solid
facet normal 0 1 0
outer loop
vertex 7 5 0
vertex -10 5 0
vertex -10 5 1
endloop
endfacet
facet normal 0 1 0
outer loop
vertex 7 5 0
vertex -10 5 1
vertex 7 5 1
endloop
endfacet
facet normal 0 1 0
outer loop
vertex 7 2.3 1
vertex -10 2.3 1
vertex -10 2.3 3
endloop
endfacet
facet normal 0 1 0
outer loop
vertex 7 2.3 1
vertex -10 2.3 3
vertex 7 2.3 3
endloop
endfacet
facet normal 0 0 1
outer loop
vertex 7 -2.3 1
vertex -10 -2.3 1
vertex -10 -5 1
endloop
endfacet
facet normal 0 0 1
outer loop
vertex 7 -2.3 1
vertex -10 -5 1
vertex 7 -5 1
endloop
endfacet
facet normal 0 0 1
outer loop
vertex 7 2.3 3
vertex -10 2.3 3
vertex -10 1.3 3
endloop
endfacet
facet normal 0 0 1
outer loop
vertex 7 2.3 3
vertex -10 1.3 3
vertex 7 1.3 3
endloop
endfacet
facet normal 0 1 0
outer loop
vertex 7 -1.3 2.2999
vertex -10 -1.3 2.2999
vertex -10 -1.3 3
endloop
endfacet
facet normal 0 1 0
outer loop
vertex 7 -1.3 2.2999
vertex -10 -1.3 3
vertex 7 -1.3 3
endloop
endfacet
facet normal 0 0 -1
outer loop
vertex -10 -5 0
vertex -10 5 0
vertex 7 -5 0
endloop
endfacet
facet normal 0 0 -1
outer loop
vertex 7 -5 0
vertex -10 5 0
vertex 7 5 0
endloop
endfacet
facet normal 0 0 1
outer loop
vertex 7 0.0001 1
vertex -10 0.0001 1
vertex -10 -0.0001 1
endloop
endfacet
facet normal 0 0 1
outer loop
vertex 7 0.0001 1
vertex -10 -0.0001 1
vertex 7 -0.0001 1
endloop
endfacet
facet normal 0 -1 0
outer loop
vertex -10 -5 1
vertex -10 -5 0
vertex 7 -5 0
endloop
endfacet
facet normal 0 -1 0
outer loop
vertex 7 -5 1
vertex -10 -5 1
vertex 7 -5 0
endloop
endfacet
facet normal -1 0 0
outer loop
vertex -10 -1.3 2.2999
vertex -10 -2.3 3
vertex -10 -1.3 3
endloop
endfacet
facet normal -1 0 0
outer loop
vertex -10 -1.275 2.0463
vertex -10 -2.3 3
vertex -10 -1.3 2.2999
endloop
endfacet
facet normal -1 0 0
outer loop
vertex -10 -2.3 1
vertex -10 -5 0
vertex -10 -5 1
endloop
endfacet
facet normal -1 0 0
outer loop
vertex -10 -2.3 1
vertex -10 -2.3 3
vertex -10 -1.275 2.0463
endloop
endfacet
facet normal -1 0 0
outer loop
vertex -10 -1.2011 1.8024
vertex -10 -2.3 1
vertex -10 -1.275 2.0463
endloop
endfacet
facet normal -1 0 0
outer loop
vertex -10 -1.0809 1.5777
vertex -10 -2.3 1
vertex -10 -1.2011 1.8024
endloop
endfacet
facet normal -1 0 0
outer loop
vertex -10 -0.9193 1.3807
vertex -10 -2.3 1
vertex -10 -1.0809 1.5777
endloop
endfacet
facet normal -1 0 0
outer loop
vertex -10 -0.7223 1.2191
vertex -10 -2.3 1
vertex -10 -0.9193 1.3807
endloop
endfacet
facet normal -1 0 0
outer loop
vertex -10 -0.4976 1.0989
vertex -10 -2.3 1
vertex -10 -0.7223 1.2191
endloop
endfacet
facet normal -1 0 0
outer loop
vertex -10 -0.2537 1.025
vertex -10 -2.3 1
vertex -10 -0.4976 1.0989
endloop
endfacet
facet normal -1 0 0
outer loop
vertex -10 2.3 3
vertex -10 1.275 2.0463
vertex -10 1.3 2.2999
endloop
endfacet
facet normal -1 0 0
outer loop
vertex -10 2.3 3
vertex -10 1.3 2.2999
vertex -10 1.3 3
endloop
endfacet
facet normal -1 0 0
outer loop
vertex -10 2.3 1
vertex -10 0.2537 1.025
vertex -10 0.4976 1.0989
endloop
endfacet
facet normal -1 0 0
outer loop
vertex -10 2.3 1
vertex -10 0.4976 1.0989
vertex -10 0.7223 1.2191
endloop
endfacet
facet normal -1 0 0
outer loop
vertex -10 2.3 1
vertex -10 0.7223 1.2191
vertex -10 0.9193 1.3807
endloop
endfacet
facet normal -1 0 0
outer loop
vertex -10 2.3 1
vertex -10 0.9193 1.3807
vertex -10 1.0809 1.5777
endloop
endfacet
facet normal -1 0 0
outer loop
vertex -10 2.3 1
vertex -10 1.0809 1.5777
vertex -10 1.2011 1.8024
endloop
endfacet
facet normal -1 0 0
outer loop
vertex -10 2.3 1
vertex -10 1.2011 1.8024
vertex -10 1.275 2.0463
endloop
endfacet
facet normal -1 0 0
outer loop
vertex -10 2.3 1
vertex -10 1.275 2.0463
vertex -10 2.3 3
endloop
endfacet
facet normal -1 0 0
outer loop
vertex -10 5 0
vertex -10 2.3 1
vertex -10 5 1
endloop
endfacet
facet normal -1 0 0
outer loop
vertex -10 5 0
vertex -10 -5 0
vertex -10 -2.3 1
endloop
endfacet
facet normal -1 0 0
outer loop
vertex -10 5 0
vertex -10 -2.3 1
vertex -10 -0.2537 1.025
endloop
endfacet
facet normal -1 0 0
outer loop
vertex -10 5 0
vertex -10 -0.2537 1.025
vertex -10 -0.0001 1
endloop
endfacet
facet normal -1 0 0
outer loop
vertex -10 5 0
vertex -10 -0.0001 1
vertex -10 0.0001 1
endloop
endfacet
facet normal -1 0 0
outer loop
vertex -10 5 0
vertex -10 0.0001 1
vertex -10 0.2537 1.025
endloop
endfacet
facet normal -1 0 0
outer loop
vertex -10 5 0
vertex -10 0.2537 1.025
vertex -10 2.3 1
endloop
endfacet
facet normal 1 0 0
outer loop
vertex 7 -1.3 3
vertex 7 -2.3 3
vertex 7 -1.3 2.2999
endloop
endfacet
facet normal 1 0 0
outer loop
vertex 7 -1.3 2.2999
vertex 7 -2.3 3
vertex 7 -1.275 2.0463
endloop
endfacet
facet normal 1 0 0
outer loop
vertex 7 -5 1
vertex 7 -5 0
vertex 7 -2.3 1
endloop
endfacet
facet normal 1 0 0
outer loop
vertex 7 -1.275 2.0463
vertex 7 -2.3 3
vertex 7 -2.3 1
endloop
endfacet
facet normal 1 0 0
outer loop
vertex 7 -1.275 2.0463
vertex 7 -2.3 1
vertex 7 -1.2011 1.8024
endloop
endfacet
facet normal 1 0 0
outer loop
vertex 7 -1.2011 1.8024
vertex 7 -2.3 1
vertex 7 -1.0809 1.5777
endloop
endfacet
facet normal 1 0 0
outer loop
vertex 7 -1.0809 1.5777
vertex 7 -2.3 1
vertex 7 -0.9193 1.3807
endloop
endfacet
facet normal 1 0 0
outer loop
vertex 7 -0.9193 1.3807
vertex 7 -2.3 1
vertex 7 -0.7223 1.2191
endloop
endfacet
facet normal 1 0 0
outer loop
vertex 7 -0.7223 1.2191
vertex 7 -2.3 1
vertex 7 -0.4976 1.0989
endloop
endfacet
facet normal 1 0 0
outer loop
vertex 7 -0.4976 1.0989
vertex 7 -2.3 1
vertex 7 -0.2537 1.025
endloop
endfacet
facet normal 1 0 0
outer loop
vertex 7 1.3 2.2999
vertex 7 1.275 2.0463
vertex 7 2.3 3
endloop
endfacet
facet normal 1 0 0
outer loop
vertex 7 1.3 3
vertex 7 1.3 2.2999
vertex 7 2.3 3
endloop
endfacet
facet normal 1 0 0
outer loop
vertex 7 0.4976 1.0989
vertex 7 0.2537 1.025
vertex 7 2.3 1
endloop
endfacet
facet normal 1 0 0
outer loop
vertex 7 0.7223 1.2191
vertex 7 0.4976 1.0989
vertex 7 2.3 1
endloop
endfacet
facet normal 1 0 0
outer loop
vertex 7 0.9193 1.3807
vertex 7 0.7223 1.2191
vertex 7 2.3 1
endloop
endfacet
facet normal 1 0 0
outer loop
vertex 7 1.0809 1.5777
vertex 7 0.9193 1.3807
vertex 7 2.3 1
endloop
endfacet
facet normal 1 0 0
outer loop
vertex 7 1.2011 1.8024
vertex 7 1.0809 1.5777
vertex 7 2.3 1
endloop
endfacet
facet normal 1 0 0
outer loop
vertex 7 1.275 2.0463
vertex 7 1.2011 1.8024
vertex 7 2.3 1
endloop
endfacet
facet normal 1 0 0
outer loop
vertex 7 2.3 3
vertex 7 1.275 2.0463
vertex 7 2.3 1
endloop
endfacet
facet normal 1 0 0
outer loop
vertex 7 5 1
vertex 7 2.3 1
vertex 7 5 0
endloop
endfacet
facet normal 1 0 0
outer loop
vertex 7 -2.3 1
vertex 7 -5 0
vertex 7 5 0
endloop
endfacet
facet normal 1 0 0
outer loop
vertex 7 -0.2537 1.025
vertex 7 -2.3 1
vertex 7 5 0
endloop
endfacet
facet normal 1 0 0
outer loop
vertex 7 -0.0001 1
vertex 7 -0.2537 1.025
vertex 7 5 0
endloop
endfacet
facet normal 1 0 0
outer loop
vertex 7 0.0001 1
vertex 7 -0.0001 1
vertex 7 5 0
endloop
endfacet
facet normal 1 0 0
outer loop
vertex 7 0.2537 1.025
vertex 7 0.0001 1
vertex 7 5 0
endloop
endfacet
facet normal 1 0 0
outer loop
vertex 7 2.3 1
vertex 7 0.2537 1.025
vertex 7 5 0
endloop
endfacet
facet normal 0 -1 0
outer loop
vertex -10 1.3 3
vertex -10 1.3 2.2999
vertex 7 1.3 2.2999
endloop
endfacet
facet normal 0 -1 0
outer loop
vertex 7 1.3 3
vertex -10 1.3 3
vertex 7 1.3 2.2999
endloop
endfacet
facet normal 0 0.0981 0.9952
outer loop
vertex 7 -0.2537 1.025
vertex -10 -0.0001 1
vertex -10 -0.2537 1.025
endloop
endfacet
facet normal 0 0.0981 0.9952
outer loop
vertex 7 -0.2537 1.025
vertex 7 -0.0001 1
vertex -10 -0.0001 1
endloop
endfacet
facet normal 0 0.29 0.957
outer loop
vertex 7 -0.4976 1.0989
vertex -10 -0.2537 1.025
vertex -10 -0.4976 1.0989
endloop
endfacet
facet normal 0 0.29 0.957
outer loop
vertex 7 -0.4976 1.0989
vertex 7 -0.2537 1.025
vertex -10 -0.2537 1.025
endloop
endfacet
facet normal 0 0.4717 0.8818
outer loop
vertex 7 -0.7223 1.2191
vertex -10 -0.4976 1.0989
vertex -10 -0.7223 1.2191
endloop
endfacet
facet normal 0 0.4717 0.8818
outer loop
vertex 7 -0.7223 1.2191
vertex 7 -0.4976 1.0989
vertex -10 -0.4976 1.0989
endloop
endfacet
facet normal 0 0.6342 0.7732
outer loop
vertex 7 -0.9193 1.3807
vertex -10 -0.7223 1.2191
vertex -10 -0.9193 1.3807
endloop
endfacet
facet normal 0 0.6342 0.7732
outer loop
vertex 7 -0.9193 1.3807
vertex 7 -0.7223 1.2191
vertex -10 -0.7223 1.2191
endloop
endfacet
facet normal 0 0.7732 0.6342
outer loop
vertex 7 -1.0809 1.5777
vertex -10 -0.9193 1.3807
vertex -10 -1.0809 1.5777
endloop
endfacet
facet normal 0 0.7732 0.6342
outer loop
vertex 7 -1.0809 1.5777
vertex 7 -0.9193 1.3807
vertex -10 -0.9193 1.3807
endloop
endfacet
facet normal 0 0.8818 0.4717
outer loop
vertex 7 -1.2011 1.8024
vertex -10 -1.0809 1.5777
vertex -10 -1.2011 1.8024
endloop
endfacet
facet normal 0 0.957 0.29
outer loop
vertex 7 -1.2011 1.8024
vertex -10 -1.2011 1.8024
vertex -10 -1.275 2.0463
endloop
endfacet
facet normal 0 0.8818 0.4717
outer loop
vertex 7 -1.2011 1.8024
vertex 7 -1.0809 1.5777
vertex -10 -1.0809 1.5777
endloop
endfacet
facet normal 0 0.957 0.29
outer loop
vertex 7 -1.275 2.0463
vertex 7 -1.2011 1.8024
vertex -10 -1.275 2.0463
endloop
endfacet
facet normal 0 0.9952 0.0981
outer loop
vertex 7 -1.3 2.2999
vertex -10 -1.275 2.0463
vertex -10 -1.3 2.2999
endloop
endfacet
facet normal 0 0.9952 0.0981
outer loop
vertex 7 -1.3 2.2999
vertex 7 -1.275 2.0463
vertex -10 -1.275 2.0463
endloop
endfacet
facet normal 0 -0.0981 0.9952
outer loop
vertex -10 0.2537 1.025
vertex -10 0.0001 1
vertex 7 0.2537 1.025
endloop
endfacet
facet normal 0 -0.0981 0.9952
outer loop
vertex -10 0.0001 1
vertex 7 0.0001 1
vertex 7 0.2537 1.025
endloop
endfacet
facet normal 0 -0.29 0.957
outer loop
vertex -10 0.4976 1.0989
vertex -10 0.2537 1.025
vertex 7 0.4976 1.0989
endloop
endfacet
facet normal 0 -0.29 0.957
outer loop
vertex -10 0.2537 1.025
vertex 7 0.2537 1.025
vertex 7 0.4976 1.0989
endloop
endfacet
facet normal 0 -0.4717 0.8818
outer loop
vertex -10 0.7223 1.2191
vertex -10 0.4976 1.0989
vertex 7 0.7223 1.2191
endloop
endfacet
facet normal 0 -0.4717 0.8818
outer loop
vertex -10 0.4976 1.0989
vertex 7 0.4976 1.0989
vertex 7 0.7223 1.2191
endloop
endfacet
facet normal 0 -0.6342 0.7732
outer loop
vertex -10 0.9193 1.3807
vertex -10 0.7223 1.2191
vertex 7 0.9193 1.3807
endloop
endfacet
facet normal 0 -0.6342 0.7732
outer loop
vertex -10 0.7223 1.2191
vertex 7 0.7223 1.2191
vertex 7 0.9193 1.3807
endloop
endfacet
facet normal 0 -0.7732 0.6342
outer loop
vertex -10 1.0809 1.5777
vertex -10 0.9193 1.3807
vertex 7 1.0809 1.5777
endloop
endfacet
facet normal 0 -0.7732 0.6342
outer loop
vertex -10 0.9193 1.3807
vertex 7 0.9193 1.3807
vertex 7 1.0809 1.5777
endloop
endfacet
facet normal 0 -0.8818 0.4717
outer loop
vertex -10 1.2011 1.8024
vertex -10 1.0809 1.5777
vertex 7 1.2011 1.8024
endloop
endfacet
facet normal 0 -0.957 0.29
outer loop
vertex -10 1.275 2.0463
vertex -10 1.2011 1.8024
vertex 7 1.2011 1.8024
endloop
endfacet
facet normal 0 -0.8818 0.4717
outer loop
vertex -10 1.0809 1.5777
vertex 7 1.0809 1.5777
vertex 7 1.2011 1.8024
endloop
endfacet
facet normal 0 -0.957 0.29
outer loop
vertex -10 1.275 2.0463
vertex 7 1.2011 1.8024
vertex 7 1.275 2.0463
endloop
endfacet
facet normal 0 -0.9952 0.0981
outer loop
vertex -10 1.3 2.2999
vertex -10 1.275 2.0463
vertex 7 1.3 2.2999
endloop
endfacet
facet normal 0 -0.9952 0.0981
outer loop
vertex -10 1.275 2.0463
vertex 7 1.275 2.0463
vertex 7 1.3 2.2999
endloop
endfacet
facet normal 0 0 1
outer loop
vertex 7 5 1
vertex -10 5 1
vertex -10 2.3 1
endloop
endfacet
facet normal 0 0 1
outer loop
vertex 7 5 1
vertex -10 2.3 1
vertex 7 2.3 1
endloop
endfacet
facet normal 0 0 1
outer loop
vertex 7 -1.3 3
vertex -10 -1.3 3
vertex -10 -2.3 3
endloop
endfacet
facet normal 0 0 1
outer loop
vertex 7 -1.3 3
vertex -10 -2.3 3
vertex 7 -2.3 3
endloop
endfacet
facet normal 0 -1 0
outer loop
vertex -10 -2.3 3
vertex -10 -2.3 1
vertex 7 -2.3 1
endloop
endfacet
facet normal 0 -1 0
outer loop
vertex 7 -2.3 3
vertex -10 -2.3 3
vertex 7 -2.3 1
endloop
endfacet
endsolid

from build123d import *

# Parameters (mm, degrees)
SKIZZE1_W                       = 17
SKIZZE1_H                       = 10
AUFSATZ_LINEAR_AUSTRAGEN1_DEPTH = 1
SKIZZE2_W                       = 17
SKIZZE2_H                       = 1
AUFSATZ_LINEAR_AUSTRAGEN2_DEPTH = 2
VERRUNDUNG1_R                   = 1.3


with BuildPart() as part:
    # Skizze1 → Aufsatz-Linear austragen1 (new body)
    with BuildSketch(Plane.XY):
        with Locations((-1.5, 0)):
            Rectangle(SKIZZE1_W, SKIZZE1_H)
    extrude(amount=AUFSATZ_LINEAR_AUSTRAGEN1_DEPTH)

    # Skizze2 → Aufsatz-Linear austragen2 (add)
    with BuildSketch(Plane.XY.offset(1)):
        with Locations((-1.5, 1.8)):
            Rectangle(SKIZZE2_W, SKIZZE2_H)
        with Locations((-1.5, -1.8)):
            Rectangle(SKIZZE2_W, SKIZZE2_H)
    extrude(amount=AUFSATZ_LINEAR_AUSTRAGEN2_DEPTH)

    # Verrundung1
    verrundung1_edges = [part.edges().sort_by_distance(p)[0] for p in [
        (-1.5, -1.3, 1),
        (-1.5, 1.3, 1),
    ]]
    fillet(verrundung1_edges, radius=VERRUNDUNG1_R - 0.0001)  # a hair under: the kernel refuses the full size


solid = part.part
